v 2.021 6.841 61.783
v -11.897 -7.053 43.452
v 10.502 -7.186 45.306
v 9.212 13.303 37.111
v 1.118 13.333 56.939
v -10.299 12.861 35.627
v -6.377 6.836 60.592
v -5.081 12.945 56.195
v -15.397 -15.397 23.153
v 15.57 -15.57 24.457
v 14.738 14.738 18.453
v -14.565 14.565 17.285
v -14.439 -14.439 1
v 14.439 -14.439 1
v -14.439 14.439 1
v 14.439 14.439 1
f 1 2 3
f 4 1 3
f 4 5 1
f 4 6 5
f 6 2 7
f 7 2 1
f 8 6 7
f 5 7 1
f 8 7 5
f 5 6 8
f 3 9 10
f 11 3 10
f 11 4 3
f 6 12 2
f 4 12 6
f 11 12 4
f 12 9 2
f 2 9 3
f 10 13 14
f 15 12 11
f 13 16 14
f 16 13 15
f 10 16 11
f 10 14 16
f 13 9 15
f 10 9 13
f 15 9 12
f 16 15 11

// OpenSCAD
//**********************************************************************
//**********************************************************************
//**********************************************************************
t=rnd(1,30);
etopkoff=1;
p=[
[-t,-t,1]
,[t,-t,1]
,[t,t,1]
,[-t,t,1]
];

p2=[
[1,-1,-1]
,[1,1,-1]
,[1,1,1]
,[1,-1,1]
];



C0=(un(rndc())+[2,0,0]);
C1=(un(rndc())+[2,2,0]);
C2=(un(rndc())+[0,2,2]);

quad(p,[rnd(0,20),rnd(-0.2,0.2),rnd(-0.2,0.2)]);
*quad(p2,[8,rnd(-0.5,0.5),rnd(-0.5,0.5)]);

module quad(ring,modifyer,i=0){
    c=avrg(ring);

    n=un(p2n(ring[0],ring[1],ring[3])+p2n(ring[3],ring[1],ring[2]));
    area=(polyarea(ring[0],ring[1],ring[3])+polyarea(ring[3],ring[1],ring[2]));
    ex=modifyer[0];
    sc=0.7*(3-i)/(3-ex/20);
    sn=([modifyer[1],modifyer[2]]);
    ns=sn[0]*n*ex;
    ew=sn[1]*n*ex; 
    nsc=sn[0];
    ewc=sn[1];

    if (i<3&&area>1){
        ep0=lerp(c+n*ex,((ring[0]+n*ex)+ns-ew),sc-ewc*0.2+nsc*0.2);
        ep1=lerp(c+n*ex,((ring[1]+n*ex)-ns-ew),sc-ewc*0.2-nsc*0.2);
        ep2=lerp(c+n*ex,((ring[2]+n*ex)-ns+ew),sc+ewc*0.2-nsc*0.2);
        ep3=lerp(c+n*ex,((ring[3]+n*ex)+ns+ew),sc+ewc*0.2+nsc*0.2);
    //    echo(ep0,ep1,ep2,ep3);
color(un((C0*abs(n[0])+C1*abs(n[1])+C2*abs(n[2])+[1,1,1]*abs(n[2]))/4)) {
    hull(){
quad([ring[0],ring[1],ep1,ep0],modifyer,100);
quad([ring[1],ring[2],ep2,ep1],modifyer,100);
quad([ring[2],ring[3],ep3,ep2],modifyer,100);
quad([ring[3],ring[0],ep0,ep3],modifyer,100);
    }
       quad ([ep0,ep1,ep2,ep3],modifyer,i+1);
        }}
    else if (i==100){
    color(un((C0*abs(n[0])+C1*abs(n[1])+C2*abs(n[2])+[1,1,1]*abs(n[2]))/4)) 
        polyhedron([ring[0],ring[1],ring[2],ring[3],c],[[0,1,2],[2,3,0]]);
       } 
       else {
    color(un((C0*abs(n[0])+C1*abs(n[1])+C2*abs(n[2])+[1,1,1]*abs(n[2]))/4)) 
        polyhedron([ring[0],ring[1],ring[2],ring[3],c+n*ex],[[0,1,4],[1,2,4],[2,3,4],[3,0,4]]);
       }

    
    }



//**********************************************************************
//**********************************************************************
//**********************************************************************

function avrg(v)=sumv(v,len(v)-1)/len(v);
function sumv(v,i,s=0) = (i==s ? v[i] : v[i] + sumv(v,i-1,s));    
function lerp(start,end,bias ) = (end * bias + start * (1 - bias));
function p2n(pa,pb,pc)=let(u=pa-pb,v=pa-pc)un([u[1]*v[2] - u[2]*v[1], u[2]*v[0] - u[0]*v[2], u[0]*v[1] - u[1]*v[0]]);
    
function len3(v) = len(v)==2?sqrt(pow(v[0], 2) + pow(v[1], 2) ):sqrt(pow(v[0], 2) + pow(v[1], 2) + pow(v[2], 2));
function un(v) = v / max(len3(v),0.000001) * 1;

function polyarea(p1 ,p2,p3)=heron ( len3(p1-p2),len3(p2-p3),len3(p2-p1));


function rnd(a,b)=a+(rands(0,1,1)[0])*(b-a);     
function rndc()=[rands(0,1,1)[0],rands(0,1,1)[0],rands(0,1,1)[0]];

function v3rnd(c)=[rands(-1,1,1)[0]*c,rands(-1,1,1)[0]*c,rands(-1,1,1)[0]]*c;

function heron(a,b,c) =let(s = (a+b+c)/2) sqrt(abs(s*(s-a)*(s-b)*(s-c)));
